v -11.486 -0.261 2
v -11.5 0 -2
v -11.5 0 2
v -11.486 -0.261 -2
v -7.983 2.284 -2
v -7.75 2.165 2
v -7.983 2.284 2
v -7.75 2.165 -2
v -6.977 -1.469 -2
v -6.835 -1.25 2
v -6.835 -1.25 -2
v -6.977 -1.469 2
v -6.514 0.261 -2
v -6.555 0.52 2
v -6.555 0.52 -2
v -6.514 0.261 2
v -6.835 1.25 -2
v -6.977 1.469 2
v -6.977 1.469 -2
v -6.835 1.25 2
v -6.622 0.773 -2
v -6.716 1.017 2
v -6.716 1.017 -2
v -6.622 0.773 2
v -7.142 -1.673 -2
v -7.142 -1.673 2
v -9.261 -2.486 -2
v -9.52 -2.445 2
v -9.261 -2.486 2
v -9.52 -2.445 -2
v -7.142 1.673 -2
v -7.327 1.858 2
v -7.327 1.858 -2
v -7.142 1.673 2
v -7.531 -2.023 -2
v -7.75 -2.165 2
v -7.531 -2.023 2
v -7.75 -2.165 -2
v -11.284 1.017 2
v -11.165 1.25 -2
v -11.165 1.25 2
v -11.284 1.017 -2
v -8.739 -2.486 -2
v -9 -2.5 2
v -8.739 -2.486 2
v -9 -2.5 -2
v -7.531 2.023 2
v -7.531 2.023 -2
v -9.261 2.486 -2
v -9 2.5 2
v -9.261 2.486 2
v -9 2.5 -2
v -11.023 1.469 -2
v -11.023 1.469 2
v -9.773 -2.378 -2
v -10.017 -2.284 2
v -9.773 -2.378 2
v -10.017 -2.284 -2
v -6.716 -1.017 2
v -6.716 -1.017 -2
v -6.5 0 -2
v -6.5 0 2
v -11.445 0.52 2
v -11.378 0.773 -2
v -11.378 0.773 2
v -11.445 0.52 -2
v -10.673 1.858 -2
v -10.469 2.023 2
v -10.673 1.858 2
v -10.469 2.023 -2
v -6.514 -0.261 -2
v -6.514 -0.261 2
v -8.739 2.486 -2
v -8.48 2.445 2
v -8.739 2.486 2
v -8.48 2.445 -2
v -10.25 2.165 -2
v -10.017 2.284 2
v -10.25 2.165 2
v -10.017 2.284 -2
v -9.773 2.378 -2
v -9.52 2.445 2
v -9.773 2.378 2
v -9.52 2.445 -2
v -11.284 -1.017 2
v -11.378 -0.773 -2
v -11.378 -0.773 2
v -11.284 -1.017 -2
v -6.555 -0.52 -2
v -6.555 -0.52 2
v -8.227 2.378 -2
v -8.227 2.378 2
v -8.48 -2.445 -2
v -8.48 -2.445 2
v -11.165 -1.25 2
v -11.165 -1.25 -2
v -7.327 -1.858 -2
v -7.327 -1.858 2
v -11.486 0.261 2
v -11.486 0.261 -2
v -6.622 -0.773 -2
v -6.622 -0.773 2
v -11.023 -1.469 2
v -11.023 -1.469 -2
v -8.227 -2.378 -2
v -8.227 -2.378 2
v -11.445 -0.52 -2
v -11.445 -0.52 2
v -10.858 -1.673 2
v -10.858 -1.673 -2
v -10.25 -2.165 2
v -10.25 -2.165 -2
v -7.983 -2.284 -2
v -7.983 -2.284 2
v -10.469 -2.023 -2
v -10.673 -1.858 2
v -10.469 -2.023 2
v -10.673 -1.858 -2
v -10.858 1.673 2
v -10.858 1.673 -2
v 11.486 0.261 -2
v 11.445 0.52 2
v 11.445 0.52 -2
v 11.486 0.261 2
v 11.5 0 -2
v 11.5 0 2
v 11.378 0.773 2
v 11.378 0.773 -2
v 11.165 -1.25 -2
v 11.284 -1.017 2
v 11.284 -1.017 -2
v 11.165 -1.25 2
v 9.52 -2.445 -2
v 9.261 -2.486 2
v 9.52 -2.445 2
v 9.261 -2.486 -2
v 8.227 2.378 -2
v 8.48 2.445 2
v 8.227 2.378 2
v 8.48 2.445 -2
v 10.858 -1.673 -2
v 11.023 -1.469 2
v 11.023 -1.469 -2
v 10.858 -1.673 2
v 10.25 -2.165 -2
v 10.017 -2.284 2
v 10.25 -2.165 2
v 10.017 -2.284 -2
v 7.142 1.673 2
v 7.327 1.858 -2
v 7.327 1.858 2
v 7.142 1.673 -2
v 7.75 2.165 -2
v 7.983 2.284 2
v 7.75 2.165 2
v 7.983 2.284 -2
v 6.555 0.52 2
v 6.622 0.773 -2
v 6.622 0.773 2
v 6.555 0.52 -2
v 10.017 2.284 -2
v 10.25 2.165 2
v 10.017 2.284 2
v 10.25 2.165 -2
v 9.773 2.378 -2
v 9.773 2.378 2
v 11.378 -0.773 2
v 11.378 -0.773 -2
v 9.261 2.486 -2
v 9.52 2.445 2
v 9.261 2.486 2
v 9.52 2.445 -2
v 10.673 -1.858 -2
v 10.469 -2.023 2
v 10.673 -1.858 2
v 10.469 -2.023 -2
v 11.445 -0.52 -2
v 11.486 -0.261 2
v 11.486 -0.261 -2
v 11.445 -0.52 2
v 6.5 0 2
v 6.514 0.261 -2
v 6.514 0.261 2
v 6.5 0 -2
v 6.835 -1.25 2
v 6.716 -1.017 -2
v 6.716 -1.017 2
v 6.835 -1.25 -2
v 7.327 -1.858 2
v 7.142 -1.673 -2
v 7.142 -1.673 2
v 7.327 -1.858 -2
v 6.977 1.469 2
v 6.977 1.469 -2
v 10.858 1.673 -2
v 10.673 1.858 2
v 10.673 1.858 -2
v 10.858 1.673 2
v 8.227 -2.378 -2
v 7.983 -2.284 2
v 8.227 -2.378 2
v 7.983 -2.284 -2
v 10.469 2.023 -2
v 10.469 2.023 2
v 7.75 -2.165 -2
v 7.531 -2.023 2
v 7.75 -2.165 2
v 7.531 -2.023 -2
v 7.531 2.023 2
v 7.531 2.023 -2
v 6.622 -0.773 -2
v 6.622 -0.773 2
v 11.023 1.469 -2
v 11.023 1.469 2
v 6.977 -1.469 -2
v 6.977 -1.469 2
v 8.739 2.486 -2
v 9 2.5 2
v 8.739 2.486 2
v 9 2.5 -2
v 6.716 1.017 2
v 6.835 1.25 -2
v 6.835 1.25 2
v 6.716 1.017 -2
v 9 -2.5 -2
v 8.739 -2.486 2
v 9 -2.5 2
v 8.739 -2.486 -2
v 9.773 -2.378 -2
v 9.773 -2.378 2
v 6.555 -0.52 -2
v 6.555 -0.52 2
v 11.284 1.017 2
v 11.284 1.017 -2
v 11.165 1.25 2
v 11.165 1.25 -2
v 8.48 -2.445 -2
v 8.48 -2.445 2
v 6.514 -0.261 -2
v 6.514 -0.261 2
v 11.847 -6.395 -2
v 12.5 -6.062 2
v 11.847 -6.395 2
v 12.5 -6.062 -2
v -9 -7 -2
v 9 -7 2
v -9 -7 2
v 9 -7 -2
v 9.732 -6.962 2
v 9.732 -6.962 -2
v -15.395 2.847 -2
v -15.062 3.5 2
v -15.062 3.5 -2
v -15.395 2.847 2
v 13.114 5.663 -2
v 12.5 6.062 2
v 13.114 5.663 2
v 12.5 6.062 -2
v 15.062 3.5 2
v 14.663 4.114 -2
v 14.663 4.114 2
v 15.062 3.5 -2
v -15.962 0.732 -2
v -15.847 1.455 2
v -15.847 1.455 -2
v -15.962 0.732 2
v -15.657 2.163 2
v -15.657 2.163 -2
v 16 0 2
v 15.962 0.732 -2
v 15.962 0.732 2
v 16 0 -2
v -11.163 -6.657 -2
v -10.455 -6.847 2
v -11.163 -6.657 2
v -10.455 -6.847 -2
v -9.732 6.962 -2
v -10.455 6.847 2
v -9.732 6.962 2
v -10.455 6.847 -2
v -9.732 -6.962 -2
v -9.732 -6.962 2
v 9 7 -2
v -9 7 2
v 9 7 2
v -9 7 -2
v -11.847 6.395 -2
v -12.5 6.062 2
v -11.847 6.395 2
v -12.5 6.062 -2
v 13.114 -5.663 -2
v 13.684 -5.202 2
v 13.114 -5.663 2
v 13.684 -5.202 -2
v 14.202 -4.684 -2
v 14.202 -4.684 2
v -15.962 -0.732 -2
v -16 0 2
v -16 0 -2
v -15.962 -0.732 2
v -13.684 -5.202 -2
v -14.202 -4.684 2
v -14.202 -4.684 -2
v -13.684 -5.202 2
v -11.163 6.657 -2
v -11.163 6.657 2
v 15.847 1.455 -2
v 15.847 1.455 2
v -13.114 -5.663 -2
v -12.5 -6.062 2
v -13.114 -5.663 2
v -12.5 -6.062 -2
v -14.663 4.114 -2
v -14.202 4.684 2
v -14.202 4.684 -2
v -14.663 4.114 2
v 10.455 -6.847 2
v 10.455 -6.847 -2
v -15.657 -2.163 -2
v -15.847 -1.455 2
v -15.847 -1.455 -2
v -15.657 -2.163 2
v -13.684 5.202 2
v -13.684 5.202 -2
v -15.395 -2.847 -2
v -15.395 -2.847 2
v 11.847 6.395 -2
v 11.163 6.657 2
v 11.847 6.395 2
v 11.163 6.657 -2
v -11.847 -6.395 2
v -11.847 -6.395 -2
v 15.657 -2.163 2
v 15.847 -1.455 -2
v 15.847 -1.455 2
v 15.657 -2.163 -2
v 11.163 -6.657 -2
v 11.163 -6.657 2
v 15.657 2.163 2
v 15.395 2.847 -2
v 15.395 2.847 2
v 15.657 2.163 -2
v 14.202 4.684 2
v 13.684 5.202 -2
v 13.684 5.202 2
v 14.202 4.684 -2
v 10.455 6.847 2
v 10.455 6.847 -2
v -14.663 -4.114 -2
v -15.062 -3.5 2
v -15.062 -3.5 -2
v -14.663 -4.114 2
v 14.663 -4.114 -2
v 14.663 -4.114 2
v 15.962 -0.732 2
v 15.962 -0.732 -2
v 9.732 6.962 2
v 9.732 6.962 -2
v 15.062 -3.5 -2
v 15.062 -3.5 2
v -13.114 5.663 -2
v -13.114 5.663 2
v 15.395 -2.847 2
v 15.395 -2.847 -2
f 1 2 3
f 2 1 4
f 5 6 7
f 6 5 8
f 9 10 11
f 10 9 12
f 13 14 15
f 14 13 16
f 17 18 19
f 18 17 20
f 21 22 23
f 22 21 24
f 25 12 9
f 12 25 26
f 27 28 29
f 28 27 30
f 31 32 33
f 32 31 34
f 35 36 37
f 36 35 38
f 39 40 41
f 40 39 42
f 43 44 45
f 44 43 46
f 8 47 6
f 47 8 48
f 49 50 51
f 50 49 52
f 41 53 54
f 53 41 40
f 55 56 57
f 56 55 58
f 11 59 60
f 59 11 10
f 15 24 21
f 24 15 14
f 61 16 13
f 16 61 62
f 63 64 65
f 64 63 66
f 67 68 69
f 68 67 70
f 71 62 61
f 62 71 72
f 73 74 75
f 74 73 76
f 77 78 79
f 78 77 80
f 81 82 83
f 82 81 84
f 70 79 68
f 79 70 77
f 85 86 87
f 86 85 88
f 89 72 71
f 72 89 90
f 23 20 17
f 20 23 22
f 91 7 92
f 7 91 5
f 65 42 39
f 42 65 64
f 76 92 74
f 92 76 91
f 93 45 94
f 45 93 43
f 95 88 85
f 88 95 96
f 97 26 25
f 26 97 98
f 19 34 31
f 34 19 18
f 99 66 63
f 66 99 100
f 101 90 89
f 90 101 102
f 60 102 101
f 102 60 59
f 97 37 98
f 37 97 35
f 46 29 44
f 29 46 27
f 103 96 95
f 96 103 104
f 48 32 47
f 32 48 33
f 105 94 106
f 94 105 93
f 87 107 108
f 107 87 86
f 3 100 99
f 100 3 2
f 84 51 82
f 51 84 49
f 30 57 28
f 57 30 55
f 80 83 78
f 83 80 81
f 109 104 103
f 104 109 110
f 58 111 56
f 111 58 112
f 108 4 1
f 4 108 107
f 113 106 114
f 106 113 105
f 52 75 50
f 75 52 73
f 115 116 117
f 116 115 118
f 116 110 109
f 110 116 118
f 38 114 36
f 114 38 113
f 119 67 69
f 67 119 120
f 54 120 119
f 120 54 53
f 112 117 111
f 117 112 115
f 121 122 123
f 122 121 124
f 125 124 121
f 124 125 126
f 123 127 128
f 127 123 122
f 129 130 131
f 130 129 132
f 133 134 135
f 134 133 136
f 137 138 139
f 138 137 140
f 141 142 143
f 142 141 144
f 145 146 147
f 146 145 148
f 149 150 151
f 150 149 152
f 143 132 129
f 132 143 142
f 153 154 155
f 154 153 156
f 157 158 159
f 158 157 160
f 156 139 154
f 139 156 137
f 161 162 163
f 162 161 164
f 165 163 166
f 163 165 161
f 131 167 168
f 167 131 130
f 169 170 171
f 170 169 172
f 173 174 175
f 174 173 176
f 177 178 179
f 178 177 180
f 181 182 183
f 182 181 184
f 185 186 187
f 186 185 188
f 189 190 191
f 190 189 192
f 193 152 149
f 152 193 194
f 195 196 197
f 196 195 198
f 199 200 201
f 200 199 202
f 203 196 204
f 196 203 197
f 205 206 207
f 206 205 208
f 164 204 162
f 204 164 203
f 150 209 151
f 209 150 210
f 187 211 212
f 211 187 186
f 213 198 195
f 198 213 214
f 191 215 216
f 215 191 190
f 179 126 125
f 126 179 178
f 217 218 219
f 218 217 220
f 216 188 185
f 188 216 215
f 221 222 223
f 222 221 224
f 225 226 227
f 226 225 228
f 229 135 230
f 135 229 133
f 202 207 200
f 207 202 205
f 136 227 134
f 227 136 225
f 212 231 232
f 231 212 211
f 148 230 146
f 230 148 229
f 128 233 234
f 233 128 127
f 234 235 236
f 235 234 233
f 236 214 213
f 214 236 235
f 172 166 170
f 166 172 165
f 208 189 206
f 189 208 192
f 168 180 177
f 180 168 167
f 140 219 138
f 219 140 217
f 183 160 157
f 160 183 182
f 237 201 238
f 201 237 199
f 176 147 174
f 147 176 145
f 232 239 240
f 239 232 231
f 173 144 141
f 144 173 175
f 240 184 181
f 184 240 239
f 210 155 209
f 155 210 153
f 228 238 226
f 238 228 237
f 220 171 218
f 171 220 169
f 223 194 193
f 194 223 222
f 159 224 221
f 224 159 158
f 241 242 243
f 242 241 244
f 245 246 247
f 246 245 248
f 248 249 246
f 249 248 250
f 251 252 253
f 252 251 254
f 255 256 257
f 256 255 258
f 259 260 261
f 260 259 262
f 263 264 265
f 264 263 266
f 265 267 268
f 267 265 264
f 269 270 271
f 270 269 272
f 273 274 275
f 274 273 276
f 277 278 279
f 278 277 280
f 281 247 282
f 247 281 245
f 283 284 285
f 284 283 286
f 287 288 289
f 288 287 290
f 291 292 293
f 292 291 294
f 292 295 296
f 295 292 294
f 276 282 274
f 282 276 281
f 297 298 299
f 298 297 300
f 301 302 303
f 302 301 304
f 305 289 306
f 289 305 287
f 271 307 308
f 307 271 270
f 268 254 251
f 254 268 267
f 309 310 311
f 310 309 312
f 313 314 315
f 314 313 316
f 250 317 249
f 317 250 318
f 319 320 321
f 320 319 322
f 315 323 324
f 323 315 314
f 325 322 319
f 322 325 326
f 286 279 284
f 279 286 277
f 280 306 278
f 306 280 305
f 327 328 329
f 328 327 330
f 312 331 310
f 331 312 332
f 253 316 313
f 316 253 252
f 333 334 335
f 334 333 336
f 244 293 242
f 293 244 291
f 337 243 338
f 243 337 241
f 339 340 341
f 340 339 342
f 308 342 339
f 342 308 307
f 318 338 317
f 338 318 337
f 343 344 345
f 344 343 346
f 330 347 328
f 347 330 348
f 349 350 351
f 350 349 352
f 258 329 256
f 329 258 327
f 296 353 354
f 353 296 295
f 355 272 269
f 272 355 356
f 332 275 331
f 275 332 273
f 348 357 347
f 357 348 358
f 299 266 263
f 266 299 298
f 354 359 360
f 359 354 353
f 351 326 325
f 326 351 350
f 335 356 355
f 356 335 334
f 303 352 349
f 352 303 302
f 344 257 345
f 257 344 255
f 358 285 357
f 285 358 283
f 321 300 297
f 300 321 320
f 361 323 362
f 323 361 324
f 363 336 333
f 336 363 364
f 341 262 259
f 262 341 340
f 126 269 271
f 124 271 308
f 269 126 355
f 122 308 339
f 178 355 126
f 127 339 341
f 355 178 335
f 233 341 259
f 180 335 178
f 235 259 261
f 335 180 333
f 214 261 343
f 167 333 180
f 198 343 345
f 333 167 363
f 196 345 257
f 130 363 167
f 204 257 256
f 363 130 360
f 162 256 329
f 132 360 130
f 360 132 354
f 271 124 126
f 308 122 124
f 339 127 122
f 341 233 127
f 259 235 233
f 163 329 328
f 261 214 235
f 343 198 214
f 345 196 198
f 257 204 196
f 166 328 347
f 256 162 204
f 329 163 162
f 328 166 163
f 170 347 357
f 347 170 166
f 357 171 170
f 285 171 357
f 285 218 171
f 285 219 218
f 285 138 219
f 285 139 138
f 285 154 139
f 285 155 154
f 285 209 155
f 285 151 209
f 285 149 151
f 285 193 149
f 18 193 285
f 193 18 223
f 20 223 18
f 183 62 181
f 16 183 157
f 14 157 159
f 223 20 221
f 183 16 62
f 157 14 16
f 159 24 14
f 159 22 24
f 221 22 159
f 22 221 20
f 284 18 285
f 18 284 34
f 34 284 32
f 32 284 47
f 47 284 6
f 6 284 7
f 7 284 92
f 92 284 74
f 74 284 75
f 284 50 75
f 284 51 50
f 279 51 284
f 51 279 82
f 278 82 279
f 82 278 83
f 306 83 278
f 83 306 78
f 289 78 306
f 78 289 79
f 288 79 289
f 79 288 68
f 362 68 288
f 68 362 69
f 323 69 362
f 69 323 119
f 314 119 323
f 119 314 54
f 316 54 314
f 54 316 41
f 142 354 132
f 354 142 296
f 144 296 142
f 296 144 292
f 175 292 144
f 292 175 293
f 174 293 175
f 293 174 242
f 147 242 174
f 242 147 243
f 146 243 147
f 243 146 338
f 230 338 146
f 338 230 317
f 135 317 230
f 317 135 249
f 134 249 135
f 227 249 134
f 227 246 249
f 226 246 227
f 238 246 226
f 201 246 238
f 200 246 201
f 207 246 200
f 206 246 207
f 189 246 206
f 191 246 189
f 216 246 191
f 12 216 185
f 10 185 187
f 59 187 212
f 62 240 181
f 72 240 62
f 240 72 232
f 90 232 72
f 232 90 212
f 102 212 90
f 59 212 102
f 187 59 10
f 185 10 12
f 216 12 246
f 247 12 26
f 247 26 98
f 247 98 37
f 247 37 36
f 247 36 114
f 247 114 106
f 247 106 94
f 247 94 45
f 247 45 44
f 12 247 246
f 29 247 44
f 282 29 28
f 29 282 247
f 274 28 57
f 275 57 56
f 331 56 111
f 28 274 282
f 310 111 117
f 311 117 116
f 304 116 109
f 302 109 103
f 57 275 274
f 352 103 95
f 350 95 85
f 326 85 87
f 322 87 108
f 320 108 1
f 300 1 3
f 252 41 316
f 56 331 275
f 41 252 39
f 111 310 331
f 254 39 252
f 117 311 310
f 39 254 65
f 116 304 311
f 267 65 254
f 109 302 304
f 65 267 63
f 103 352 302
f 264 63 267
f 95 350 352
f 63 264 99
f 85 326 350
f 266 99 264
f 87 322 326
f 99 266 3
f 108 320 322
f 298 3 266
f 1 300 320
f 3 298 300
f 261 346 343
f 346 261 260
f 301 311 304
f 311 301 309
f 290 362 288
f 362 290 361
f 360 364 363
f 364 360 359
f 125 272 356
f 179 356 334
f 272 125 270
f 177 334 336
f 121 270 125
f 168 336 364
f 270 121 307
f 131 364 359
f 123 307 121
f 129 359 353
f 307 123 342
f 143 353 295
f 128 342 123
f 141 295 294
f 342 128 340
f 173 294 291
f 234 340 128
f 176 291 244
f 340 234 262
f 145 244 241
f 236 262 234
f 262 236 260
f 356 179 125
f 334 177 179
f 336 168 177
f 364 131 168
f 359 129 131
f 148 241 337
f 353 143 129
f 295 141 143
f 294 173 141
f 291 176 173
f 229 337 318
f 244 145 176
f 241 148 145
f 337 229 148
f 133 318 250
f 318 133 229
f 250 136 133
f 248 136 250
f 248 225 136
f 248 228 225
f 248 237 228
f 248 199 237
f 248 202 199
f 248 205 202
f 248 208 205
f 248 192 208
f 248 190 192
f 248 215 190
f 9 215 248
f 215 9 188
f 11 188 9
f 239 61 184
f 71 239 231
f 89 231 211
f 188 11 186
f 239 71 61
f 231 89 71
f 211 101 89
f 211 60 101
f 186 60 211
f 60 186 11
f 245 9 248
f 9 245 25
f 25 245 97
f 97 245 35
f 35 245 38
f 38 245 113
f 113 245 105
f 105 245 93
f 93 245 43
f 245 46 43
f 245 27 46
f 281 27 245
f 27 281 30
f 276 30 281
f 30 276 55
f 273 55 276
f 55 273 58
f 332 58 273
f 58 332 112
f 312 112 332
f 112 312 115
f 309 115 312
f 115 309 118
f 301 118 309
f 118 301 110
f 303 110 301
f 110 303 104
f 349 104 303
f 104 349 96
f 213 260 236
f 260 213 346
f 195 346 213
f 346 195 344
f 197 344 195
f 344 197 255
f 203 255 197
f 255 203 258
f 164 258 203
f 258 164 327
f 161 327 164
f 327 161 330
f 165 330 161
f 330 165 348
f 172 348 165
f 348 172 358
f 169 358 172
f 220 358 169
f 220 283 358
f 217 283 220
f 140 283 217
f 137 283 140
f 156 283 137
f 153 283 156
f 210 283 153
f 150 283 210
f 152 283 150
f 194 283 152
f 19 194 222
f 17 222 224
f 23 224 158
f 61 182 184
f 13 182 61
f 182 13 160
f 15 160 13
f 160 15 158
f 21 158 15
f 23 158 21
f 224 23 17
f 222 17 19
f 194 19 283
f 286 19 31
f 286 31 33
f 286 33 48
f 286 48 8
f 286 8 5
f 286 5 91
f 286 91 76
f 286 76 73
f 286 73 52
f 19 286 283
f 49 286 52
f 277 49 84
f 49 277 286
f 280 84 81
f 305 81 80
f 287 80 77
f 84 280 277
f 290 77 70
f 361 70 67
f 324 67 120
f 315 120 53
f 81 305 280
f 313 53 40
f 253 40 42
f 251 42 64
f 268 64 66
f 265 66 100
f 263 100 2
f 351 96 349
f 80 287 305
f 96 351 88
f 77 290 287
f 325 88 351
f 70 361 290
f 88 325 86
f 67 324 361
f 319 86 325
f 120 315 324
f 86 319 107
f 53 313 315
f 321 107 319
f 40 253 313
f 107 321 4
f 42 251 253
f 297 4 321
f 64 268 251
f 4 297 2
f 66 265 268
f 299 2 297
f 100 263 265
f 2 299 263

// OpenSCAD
// Two-hole link plate.
$fn = 60;
eps = 0.02;
hole_d = 5;
length = 32;
width = 14;
thickness = 4;
difference() { hull() { translate([-length/2+width/2,0,0]) cylinder(d=width,h=thickness,center=true); translate([length/2-width/2,0,0]) cylinder(d=width,h=thickness,center=true); } for(x=[-length/2+width/2,length/2-width/2]) translate([x,0,-thickness/2-eps]) cylinder(d=hole_d,h=thickness+2*eps); }
